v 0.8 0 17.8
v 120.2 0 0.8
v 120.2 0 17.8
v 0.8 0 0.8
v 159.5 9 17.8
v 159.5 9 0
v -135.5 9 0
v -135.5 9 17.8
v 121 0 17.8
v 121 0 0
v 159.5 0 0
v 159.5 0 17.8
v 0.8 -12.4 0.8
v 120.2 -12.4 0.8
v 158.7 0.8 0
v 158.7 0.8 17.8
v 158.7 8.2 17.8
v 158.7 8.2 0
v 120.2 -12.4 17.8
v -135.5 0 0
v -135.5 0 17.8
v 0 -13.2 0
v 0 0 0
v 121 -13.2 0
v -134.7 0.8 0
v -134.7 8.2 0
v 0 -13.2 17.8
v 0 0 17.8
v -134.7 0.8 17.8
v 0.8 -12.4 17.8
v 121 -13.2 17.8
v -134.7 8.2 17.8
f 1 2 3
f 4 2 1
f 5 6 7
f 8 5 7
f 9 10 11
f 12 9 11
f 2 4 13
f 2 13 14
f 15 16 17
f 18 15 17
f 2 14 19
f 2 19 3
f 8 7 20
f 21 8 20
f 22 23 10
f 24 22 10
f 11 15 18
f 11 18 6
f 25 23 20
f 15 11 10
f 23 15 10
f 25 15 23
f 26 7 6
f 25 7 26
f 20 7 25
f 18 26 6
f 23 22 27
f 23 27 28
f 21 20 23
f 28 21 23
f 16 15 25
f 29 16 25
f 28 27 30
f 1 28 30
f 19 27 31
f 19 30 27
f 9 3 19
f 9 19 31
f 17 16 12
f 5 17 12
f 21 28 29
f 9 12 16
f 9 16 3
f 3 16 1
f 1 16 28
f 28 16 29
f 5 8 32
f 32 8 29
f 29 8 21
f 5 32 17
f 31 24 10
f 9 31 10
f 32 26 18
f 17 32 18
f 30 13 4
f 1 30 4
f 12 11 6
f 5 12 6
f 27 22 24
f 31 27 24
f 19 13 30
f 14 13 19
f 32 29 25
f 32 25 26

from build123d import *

# Parameters (mm, degrees)
F2_W     = 0.8
F2_H     = 7.4
F2_W_2   = 121
F2_H_2   = 13.2
F3_DEPTH = 17.8
F4_T     = -0.8


# Not quite as in the source:
# - a shell that OpenCascade refuses in one call is made with other operations: the cavity is built on its own and cut out


with BuildPart() as f3:
    # F2 (on Top) → F3 (new body)
    with BuildSketch(Plane.XY):
        Polygon((-135.5, 9), (-135.5, 8.2), (-134.7, 8.2), (158.7, 8.2), (159.5, 8.2), (159.5, 9), align=None)
        with Locations((159.1, 4.5)):
            Rectangle(F2_W, F2_H)
        with Locations((-135.1, 4.5)):
            Rectangle(F2_W, F2_H)
        with Locations((60.5, -6.6)):
            Rectangle(F2_W_2, F2_H_2)
        Polygon((-135.5, 0), (0, 0), (121, 0), (159.5, 0), (159.5, 0.8), (158.7, 0.8), (-134.7, 0.8), (-135.5, 0.8), align=None)
    extrude(amount=F3_DEPTH)

    # F4: a shell. OpenCascade refuses it in one call, so the cavity is built on its own and cut out:
    # the body offset inwards by the wall thickness, plus a prism from it out through each open face.
    f4_core = offset(f3.part, amount=F4_T, kind=Kind.INTERSECTION, mode=Mode.PRIVATE)
    f4_exits = [f4_core.faces().sort_by_distance(p)[0] for p in [
        (60.5, -6.2, 17),
    ]]
    add(f4_core, mode=Mode.SUBTRACT)
    extrude(f4_exits, amount=-F4_T, mode=Mode.SUBTRACT)


solid = f3.part
